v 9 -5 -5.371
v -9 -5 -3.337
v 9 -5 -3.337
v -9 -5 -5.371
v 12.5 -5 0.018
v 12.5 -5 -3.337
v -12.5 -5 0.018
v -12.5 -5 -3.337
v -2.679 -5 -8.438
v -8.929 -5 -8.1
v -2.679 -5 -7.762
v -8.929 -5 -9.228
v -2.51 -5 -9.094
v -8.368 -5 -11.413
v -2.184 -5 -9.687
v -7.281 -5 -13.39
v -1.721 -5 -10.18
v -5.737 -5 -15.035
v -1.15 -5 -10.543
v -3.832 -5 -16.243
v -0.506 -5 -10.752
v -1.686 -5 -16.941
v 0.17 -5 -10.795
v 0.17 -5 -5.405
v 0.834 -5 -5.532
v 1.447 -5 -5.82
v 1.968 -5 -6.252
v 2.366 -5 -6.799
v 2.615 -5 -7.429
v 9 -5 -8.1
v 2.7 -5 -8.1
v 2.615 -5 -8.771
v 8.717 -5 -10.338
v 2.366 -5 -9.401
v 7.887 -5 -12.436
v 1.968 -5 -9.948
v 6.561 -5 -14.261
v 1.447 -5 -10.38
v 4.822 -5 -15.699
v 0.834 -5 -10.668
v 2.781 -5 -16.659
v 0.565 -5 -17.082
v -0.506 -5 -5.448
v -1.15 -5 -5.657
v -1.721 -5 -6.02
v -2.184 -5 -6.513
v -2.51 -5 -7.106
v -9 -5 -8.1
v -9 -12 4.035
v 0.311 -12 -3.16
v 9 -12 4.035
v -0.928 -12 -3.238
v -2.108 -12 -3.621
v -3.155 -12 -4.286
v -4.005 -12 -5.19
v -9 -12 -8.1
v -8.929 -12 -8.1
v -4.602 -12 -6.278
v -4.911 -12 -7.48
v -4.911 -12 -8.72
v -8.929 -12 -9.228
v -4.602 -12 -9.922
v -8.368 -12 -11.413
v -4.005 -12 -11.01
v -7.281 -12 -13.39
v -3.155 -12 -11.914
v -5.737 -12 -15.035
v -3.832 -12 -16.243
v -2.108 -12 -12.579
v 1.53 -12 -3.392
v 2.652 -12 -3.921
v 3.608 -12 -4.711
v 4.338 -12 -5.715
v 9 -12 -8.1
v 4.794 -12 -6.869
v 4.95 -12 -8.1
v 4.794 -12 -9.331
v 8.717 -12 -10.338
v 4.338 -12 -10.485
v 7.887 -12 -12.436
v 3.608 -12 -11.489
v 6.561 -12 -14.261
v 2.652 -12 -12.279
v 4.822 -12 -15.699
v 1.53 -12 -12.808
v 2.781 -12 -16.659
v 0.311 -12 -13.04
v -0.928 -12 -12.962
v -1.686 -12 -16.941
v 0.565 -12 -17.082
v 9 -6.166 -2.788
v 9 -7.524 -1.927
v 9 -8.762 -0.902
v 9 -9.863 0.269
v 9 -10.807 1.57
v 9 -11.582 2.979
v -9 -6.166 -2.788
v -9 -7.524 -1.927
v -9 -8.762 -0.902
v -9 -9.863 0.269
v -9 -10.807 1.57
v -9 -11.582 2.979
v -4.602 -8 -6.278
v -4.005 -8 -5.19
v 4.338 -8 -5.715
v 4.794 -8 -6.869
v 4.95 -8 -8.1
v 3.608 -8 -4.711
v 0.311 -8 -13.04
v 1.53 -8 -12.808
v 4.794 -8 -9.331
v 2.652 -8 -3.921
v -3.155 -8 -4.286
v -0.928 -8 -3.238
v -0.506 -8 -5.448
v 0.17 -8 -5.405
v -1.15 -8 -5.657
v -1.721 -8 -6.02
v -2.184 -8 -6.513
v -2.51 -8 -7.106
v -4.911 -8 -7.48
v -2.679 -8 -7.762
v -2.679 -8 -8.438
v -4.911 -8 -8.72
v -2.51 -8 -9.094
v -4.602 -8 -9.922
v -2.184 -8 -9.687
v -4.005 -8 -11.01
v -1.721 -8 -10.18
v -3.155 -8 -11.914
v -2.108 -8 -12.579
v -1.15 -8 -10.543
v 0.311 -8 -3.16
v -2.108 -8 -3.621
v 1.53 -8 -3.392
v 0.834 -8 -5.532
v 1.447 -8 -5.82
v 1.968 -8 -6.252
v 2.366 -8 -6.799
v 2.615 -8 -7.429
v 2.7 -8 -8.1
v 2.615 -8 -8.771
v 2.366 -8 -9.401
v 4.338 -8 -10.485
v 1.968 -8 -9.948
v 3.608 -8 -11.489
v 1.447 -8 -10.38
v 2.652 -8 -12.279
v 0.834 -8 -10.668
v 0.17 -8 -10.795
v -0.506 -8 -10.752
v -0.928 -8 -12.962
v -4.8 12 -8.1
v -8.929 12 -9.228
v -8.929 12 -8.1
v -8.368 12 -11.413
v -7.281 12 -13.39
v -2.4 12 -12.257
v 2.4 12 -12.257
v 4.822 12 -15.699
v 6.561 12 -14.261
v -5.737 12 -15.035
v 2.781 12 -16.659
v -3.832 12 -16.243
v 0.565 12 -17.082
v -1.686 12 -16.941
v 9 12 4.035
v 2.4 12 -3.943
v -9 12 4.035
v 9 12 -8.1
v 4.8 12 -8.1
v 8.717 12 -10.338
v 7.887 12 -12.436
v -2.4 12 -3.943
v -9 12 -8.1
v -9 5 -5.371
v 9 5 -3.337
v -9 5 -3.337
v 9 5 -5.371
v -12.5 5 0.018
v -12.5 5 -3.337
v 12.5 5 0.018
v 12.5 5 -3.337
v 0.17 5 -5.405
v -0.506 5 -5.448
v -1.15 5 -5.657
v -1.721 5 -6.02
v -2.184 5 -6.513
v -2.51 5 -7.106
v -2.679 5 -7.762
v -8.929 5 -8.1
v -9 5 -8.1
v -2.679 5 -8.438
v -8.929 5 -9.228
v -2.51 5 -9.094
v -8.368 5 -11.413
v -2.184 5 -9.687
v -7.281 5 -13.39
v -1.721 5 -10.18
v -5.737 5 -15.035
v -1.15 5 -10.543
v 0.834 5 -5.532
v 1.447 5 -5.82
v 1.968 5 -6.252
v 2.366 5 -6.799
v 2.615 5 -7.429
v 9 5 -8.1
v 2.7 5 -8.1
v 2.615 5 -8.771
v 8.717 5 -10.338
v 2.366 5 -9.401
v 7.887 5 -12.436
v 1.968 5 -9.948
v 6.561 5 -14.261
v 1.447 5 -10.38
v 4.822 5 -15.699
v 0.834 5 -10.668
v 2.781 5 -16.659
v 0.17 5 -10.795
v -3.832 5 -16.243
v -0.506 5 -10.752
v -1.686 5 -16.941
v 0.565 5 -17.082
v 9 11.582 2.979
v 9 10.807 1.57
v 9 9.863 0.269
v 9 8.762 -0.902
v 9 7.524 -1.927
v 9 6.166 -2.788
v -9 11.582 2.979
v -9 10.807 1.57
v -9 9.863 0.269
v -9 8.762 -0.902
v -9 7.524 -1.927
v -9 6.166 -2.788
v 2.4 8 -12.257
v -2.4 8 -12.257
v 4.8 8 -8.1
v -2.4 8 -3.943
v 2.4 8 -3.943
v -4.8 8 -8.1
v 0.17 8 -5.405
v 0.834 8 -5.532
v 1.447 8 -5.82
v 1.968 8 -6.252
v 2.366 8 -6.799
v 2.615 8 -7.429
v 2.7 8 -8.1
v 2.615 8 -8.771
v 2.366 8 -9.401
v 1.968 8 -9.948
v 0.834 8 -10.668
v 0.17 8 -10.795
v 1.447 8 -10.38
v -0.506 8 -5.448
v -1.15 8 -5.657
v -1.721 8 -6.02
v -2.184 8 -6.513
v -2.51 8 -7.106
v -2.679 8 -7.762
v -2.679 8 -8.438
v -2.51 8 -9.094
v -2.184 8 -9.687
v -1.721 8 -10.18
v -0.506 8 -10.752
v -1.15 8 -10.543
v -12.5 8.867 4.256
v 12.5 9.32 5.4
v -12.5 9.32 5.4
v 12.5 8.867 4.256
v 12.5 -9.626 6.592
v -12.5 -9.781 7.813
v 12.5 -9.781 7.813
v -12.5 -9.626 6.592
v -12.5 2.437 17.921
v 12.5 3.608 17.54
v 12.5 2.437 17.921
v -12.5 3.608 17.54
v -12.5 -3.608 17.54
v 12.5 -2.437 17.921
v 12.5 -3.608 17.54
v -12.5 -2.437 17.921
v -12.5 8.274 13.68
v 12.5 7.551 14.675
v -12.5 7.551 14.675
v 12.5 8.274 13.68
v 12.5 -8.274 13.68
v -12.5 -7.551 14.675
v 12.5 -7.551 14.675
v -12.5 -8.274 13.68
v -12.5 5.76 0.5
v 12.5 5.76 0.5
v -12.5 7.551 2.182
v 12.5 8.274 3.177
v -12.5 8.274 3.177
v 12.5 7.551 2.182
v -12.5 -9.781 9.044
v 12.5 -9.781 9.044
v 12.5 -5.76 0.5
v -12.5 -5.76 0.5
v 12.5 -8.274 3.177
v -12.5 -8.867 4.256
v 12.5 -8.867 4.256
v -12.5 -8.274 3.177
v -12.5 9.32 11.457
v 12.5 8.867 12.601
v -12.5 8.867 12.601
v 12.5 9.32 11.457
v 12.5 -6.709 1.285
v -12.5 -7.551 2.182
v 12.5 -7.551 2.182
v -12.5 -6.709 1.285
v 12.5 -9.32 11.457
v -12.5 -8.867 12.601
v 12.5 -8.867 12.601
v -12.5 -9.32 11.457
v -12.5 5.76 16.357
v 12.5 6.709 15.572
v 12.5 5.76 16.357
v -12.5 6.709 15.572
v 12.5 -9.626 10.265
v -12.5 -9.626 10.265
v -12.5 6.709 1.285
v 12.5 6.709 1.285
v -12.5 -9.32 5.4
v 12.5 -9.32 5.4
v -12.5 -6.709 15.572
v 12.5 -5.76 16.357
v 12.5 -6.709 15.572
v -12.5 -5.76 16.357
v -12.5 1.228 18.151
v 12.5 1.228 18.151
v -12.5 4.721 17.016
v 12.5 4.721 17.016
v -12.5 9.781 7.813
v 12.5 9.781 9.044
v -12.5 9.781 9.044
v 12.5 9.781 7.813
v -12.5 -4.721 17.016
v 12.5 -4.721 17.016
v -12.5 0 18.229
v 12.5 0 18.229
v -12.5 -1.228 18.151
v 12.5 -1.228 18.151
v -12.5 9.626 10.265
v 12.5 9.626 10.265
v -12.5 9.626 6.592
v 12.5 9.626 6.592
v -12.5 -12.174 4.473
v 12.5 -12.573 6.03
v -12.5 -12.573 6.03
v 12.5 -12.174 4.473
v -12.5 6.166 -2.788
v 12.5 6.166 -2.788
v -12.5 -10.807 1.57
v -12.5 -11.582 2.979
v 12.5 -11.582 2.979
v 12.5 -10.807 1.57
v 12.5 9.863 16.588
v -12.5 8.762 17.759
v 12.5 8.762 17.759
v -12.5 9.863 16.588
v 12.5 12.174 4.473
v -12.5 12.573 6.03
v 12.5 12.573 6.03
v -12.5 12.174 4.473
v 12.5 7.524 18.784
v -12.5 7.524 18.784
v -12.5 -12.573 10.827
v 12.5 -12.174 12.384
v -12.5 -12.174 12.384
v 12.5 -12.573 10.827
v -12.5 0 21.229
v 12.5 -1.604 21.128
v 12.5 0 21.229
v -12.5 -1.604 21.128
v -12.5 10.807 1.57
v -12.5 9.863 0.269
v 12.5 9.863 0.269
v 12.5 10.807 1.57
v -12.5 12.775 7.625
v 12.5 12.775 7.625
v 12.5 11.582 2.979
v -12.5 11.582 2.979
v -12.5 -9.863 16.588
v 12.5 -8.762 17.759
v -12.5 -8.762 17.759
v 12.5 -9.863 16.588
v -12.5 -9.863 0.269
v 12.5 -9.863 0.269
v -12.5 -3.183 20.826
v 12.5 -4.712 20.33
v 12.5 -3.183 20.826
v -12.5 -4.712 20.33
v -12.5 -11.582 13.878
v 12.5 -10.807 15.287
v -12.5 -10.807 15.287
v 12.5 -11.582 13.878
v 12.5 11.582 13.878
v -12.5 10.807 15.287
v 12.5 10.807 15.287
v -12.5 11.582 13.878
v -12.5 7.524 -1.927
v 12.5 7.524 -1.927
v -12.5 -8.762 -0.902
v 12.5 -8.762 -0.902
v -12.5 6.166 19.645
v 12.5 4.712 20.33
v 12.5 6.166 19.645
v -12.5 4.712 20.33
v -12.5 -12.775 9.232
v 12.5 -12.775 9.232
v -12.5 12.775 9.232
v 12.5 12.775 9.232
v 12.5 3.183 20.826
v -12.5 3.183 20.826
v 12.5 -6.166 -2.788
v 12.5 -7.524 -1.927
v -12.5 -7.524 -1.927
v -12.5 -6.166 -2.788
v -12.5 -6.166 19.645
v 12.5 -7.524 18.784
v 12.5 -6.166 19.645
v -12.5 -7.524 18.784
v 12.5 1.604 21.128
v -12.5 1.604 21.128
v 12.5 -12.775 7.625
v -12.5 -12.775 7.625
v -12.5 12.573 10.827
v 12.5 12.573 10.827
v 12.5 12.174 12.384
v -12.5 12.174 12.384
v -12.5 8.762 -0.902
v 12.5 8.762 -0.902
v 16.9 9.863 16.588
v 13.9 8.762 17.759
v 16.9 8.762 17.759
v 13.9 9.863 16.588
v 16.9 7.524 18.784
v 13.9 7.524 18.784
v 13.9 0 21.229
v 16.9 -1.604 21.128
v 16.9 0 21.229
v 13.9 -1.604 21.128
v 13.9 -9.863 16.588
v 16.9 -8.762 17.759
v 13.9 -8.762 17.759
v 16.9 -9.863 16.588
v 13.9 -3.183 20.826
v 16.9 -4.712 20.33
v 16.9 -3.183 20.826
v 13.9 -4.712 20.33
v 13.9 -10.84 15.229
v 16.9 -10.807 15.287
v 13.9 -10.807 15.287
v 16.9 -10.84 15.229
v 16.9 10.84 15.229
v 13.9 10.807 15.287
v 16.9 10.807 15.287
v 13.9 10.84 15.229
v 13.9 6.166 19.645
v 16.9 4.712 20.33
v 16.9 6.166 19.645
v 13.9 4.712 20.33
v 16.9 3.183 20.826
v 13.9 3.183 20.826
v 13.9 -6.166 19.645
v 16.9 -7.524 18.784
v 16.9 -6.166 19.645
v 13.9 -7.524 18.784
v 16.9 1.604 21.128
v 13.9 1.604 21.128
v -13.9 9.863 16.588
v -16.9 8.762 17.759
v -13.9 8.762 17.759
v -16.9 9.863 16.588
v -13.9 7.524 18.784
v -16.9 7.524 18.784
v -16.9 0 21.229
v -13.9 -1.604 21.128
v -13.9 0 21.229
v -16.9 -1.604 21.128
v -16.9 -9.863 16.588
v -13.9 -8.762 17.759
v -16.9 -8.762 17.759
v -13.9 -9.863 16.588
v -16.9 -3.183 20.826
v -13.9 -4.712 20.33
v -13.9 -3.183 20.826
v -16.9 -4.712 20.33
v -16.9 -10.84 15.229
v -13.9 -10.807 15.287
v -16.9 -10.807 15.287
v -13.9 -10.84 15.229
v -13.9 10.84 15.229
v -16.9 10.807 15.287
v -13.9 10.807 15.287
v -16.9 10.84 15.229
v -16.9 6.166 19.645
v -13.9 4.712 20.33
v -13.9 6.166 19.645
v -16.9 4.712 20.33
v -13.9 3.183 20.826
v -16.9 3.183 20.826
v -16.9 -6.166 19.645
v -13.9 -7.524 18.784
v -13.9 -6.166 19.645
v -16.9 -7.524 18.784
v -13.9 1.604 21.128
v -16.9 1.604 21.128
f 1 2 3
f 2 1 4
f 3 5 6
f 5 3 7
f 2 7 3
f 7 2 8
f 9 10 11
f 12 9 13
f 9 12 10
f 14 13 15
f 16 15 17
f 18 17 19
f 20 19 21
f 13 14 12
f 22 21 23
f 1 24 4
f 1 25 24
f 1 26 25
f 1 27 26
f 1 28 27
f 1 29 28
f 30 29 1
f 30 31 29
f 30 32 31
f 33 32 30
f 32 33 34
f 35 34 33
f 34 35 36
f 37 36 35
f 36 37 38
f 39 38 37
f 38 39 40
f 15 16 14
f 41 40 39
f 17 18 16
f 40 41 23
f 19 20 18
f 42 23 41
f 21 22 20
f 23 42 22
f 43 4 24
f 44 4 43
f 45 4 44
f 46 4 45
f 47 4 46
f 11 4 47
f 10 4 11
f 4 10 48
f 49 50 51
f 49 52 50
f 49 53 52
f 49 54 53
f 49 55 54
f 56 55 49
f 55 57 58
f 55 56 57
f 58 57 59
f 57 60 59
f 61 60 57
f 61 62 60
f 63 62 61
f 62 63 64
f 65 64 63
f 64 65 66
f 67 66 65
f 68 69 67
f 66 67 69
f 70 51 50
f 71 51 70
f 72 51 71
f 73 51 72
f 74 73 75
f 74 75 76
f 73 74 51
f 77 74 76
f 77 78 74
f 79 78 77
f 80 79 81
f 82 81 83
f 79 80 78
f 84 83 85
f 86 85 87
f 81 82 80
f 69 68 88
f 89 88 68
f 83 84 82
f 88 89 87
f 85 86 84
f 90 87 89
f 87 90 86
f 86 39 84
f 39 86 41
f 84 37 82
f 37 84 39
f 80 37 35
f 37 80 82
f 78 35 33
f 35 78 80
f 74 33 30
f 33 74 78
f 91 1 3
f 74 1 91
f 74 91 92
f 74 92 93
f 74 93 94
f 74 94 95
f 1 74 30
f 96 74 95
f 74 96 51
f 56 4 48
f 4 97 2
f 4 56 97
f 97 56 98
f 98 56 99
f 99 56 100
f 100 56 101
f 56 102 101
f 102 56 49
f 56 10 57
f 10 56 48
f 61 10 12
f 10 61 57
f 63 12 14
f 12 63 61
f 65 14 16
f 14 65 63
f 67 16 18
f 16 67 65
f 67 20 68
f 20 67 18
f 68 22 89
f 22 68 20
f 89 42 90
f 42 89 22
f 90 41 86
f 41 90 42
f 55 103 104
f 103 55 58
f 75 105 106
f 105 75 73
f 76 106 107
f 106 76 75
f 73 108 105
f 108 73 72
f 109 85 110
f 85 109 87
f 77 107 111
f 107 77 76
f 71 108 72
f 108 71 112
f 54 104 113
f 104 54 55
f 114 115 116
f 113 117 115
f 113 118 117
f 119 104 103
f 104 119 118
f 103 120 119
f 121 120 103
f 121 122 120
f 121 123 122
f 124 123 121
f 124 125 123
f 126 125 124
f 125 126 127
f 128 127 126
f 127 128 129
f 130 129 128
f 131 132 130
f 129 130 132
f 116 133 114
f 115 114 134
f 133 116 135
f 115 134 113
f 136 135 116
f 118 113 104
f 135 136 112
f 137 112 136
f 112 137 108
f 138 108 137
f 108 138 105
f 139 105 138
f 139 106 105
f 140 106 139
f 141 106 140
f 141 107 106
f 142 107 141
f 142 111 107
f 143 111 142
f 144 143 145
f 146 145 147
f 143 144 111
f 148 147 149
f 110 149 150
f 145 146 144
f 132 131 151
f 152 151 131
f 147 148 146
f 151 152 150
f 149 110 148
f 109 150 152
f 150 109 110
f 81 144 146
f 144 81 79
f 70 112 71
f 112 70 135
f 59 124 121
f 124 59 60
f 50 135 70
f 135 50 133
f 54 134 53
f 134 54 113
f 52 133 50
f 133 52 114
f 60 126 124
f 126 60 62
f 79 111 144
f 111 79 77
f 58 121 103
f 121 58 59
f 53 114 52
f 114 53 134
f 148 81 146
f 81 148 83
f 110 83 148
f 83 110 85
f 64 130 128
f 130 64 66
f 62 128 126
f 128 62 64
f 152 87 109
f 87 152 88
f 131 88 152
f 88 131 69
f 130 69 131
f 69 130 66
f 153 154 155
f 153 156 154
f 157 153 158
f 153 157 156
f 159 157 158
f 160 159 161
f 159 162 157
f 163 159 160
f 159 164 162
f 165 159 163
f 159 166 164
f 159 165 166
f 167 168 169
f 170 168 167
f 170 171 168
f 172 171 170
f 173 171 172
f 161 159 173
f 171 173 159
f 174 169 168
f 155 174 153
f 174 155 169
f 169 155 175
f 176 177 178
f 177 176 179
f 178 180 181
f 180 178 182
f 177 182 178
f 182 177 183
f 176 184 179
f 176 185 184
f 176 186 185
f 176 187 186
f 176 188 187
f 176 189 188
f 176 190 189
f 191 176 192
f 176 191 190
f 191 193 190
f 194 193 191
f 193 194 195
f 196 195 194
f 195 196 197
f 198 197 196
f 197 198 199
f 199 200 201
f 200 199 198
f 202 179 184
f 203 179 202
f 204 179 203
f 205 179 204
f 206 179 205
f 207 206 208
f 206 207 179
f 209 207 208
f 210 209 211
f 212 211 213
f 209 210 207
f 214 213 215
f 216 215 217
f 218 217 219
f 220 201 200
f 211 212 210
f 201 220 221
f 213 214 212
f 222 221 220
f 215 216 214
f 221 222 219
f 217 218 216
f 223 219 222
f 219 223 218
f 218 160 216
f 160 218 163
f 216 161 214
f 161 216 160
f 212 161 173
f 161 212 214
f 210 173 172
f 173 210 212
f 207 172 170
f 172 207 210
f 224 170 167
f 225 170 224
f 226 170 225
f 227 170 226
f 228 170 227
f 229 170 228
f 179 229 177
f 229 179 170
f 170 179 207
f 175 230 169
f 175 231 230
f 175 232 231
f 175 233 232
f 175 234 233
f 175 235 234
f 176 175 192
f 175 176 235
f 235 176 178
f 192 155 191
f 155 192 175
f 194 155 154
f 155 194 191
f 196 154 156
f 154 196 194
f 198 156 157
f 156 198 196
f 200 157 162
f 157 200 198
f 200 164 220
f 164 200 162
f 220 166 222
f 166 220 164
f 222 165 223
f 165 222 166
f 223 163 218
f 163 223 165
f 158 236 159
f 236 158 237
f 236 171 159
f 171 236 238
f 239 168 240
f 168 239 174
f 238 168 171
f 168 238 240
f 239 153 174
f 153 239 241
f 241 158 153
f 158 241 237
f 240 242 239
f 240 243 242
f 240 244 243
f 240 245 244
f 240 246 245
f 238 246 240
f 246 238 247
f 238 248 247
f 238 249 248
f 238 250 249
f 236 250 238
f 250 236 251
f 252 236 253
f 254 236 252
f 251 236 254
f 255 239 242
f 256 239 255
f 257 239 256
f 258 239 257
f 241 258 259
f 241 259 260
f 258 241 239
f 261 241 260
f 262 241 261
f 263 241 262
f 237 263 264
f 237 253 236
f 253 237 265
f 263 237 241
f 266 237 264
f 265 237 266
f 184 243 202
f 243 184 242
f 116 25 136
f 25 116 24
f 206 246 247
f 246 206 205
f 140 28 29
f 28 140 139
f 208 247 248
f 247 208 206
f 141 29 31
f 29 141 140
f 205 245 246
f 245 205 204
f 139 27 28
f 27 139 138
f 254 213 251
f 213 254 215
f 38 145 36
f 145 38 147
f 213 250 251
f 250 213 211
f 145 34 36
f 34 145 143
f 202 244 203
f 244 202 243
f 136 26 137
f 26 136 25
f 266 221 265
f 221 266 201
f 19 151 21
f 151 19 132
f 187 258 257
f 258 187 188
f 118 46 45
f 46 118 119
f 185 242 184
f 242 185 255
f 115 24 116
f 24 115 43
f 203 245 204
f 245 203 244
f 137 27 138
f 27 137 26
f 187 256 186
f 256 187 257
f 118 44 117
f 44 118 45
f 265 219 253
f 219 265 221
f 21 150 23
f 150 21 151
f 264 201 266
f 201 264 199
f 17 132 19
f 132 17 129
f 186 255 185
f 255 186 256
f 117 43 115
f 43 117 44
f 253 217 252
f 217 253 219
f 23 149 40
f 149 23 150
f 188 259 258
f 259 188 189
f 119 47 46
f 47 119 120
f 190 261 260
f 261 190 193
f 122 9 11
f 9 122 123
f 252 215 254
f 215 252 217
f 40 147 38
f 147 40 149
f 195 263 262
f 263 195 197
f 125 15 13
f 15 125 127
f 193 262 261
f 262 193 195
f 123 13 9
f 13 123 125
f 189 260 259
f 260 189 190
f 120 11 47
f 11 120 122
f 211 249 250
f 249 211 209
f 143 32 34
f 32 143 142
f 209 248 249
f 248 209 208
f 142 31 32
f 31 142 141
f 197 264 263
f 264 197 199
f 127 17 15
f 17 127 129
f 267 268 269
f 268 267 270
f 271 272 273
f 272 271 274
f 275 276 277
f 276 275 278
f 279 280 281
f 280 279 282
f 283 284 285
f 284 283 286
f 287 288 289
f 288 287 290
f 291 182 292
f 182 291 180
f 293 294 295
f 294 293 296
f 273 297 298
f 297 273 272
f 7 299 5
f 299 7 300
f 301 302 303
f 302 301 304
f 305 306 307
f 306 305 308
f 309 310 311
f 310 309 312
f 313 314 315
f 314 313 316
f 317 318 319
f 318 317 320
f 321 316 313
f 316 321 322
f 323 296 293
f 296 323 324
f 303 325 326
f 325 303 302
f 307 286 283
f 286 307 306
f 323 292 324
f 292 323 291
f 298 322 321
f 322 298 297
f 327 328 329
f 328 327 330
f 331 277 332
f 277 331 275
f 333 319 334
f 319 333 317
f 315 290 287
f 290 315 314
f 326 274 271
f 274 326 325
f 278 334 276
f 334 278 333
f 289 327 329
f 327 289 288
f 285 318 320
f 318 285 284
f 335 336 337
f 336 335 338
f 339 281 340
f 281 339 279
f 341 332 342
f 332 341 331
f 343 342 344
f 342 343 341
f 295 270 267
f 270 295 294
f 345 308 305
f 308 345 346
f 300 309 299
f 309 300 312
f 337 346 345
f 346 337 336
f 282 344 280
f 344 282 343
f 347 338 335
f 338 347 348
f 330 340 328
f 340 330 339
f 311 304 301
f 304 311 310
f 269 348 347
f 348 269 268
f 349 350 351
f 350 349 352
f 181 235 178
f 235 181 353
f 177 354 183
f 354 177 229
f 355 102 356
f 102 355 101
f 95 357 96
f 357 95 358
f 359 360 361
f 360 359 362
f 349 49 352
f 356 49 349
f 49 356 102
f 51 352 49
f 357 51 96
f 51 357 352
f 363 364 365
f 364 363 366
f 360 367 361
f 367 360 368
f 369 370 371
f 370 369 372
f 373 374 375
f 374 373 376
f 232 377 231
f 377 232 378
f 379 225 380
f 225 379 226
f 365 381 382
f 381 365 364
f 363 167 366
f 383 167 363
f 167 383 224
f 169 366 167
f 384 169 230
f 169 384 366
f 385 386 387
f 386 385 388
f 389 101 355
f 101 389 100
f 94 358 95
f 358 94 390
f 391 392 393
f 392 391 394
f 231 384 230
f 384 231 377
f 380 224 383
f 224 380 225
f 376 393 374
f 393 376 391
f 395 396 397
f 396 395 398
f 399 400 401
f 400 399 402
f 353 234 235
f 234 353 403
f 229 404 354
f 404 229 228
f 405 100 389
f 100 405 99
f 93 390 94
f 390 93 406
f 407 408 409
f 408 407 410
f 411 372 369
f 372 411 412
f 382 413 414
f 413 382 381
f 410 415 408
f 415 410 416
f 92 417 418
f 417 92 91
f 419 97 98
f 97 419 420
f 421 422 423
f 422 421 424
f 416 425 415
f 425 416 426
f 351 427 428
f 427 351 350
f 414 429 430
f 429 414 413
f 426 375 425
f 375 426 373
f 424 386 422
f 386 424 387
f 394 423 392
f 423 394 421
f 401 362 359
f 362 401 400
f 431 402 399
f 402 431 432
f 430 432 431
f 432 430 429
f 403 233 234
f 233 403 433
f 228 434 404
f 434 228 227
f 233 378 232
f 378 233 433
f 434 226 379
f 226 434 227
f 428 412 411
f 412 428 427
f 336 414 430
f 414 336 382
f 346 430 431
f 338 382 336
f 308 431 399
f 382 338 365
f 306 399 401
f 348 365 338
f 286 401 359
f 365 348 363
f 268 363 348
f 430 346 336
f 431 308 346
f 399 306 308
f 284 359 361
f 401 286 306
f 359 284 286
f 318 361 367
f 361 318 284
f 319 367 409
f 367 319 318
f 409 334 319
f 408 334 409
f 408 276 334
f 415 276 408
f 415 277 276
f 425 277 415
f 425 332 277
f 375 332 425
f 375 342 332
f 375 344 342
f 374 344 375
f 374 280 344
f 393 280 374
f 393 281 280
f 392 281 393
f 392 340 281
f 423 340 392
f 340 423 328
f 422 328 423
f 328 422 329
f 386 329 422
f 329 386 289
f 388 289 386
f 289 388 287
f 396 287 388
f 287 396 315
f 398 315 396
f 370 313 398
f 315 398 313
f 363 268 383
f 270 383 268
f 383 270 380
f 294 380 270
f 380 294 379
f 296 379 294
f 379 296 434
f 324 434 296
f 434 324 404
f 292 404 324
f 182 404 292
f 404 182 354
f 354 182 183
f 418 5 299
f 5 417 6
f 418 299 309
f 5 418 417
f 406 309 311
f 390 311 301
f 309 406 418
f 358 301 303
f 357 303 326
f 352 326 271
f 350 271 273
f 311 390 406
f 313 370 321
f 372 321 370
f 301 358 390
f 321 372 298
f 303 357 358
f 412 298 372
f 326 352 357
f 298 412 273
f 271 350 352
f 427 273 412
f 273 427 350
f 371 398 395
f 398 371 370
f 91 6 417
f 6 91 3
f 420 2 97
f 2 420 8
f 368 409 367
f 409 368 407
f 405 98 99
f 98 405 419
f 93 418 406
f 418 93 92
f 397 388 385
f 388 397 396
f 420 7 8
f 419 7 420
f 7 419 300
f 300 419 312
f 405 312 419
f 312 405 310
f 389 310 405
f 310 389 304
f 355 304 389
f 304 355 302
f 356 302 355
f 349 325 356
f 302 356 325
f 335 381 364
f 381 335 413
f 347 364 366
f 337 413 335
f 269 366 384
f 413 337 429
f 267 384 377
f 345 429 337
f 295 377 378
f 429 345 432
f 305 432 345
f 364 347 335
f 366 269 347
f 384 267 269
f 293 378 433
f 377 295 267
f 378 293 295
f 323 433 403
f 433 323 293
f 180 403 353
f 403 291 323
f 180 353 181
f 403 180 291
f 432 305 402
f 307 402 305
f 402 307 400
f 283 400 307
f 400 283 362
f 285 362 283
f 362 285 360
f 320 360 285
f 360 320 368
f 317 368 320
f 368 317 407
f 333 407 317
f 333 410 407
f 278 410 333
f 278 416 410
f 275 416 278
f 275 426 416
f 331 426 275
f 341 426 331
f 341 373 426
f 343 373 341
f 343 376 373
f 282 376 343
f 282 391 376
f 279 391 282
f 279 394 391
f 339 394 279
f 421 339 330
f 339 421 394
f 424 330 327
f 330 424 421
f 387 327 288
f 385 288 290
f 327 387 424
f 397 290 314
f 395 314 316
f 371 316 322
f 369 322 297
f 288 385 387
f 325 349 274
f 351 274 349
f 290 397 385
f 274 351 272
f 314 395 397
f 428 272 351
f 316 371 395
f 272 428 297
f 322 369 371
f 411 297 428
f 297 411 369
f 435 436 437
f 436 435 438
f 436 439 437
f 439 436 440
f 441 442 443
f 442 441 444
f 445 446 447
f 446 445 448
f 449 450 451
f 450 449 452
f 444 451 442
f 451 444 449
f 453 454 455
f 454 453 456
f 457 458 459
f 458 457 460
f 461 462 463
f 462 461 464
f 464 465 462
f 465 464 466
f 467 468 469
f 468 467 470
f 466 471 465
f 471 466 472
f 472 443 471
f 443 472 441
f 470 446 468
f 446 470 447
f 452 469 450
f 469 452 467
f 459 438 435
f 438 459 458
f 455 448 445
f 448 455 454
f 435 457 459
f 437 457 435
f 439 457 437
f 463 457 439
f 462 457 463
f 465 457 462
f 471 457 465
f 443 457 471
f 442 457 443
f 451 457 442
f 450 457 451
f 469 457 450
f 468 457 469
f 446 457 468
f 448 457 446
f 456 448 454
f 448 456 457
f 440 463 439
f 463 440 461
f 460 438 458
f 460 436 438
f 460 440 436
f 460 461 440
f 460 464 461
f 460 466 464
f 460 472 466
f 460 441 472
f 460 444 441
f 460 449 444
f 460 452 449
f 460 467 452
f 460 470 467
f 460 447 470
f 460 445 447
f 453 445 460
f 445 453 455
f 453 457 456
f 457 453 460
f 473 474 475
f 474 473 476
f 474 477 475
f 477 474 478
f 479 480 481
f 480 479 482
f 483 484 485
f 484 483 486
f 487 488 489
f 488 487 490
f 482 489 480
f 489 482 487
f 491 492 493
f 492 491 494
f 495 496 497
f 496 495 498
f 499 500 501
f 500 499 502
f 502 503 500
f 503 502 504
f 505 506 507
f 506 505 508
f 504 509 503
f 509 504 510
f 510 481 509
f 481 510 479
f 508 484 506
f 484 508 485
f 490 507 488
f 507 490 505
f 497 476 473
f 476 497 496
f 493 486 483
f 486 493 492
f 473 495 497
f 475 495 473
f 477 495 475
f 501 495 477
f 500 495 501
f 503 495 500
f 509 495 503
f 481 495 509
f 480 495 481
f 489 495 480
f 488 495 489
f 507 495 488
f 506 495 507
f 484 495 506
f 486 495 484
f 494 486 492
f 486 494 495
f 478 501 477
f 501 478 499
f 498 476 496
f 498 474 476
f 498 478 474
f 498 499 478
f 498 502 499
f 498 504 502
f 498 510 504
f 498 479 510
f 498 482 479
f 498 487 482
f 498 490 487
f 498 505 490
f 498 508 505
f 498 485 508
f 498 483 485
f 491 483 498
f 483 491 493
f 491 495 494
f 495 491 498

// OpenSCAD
// file: rj260_linear_bearing.scad
// Copyright 2017 Pavel Penev
// https://www.thingiverse.com/pavpen/about
//
// You can use this file under Attribution-ShareAlike 4.0 International
// (CC BY-SA 4.0).
//
// If you need to use it under another license, send me a message.

// Parameters for J260 Igus linear bearings
// <http://www.igus.com/wpck/3660/drylin_r_rj260um_02>:
outer_r = 19.2 / 2 + 0.2;
inner_r = 12.15 / 2;

// Length of the part actually intended to contact the axle:
sleeve_length = 25 - 0.2;
chamfer_length = 1.5;

// Total length of the bearing:
length = sleeve_length + 2 * chamfer_length;

outer_chamfer_angle = 15;
inner_chamfer_angle = 15;

fn = 100;


// Export functions:
function pro_pavpen_rj260_linear_bearing_outer_r() = outer_r;
function pro_pavpen_rj260_linear_bearing_inner_r() = inner_r;
function pro_pavpen_rj260_linear_bearing_sleeve_length() = sleeve_length;
function pro_pavpen_rj260_linear_bearing_length() = length;

// Demo:
pro_pavpen_rj260_linear_bearing();


module pro_pavpen_rj260_linear_bearing()
{
    difference()
    {
        union()
        {
            translate([0, 0, chamfer_length])
            cylinder(r = outer_r, h = sleeve_length, $fn = fn);
            
            // Top outer chamfer:
            translate([0, 0, chamfer_length + sleeve_length])
            cylinder(
                r1 = outer_r,
                r2 = outer_r - chamfer_length * tan(outer_chamfer_angle),
                h = chamfer_length,
                $fn = fn);
            
            // Bottom outer chamfer:
            cylinder(
                r1 = outer_r - chamfer_length * tan(outer_chamfer_angle),
                r2 = outer_r,
                h = chamfer_length,
                $fn = fn);
        }
        
        translate([0, 0, -1])
        cylinder(r = inner_r, h = length + 2, $fn = fn);
        
        // Top inner chamfer:
        translate([0, 0, chamfer_length + sleeve_length])
        cylinder(
            r1 = inner_r,
            r2 = inner_r + (chamfer_length + 1) * tan(inner_chamfer_angle),
            h = chamfer_length + 1,
            $fn = fn);
        
        // Bottom inner chamfer:
        translate([0, 0, -1])
        cylinder(
            r1 = inner_r + (chamfer_length + 1) * tan(inner_chamfer_angle),
            r2 = inner_r,
            h = chamfer_length + 1,
            $fn = fn);
    }
}
// main file
// Copyright 2017 Pavel Penev
// https://www.thingiverse.com/pavpen/about
//
// You can use this file under Attribution-ShareAlike 4.0 International
// (CC BY-SA 4.0).
//
// If you need to use it under another license, send me a message.

use <linear_bearing_bracket.scad>
use <rj260_linear_bearing.scad>


lip_thickness = 3;
lip_height = 3;
fn = 50;

// Export functions:
function pro_pavpen_linear_bearing_bracket_lip_thickness() =
    lip_thickness;

function pro_pavpen_linear_bearing_bracket_lip_height() =
    lip_heght;


// Demo:
pro_pavpen_linear_bearing_bracket();
pro_pavpen_linear_bearing_bracket_front_lip();
pro_pavpen_linear_bearing_bracket_back_lip();


module pro_pavpen_linear_bearing_bracket_front_lip()
{
    translate([
        pro_pavpen_rj260_linear_bearing_length() / 2,
        0,
        pro_pavpen_linear_bearing_bracket_z_offset_to_center() +
            pro_pavpen_rj260_linear_bearing_outer_r() +
            pro_pavpen_linear_bearing_bracket_wall_thickness() -
            lip_height])
    pro_pavpen_linear_bearing_bracket_lip();
}

module pro_pavpen_linear_bearing_bracket_back_lip()
{
    translate([
        -lip_thickness - pro_pavpen_rj260_linear_bearing_length() / 2,
        0,
        pro_pavpen_linear_bearing_bracket_z_offset_to_center() +
            pro_pavpen_rj260_linear_bearing_outer_r() +
            pro_pavpen_linear_bearing_bracket_wall_thickness() -
            lip_height])
    pro_pavpen_linear_bearing_bracket_lip();
}

module pro_pavpen_linear_bearing_bracket_lip()
{
    translate([
        0,
        0,
        -pro_pavpen_rj260_linear_bearing_outer_r() -
            pro_pavpen_linear_bearing_bracket_wall_thickness() +
            lip_height])
    rotate([0, 90, 0])
    difference()
    {
        cylinder(
            r = pro_pavpen_rj260_linear_bearing_outer_r() +
                pro_pavpen_linear_bearing_bracket_wall_thickness(),
            h = lip_thickness,
            $fn = fn);

        translate([
            -pro_pavpen_rj260_linear_bearing_outer_r() + lip_height,
            -pro_pavpen_rj260_linear_bearing_outer_r() -
                pro_pavpen_linear_bearing_bracket_wall_thickness() - 1,
            -1])
        cube([
            2 * (pro_pavpen_rj260_linear_bearing_outer_r() +
                pro_pavpen_linear_bearing_bracket_wall_thickness()),
            2 * (pro_pavpen_rj260_linear_bearing_outer_r() +
                pro_pavpen_linear_bearing_bracket_wall_thickness()) + 2,
            lip_thickness + 2]);
    }
}
